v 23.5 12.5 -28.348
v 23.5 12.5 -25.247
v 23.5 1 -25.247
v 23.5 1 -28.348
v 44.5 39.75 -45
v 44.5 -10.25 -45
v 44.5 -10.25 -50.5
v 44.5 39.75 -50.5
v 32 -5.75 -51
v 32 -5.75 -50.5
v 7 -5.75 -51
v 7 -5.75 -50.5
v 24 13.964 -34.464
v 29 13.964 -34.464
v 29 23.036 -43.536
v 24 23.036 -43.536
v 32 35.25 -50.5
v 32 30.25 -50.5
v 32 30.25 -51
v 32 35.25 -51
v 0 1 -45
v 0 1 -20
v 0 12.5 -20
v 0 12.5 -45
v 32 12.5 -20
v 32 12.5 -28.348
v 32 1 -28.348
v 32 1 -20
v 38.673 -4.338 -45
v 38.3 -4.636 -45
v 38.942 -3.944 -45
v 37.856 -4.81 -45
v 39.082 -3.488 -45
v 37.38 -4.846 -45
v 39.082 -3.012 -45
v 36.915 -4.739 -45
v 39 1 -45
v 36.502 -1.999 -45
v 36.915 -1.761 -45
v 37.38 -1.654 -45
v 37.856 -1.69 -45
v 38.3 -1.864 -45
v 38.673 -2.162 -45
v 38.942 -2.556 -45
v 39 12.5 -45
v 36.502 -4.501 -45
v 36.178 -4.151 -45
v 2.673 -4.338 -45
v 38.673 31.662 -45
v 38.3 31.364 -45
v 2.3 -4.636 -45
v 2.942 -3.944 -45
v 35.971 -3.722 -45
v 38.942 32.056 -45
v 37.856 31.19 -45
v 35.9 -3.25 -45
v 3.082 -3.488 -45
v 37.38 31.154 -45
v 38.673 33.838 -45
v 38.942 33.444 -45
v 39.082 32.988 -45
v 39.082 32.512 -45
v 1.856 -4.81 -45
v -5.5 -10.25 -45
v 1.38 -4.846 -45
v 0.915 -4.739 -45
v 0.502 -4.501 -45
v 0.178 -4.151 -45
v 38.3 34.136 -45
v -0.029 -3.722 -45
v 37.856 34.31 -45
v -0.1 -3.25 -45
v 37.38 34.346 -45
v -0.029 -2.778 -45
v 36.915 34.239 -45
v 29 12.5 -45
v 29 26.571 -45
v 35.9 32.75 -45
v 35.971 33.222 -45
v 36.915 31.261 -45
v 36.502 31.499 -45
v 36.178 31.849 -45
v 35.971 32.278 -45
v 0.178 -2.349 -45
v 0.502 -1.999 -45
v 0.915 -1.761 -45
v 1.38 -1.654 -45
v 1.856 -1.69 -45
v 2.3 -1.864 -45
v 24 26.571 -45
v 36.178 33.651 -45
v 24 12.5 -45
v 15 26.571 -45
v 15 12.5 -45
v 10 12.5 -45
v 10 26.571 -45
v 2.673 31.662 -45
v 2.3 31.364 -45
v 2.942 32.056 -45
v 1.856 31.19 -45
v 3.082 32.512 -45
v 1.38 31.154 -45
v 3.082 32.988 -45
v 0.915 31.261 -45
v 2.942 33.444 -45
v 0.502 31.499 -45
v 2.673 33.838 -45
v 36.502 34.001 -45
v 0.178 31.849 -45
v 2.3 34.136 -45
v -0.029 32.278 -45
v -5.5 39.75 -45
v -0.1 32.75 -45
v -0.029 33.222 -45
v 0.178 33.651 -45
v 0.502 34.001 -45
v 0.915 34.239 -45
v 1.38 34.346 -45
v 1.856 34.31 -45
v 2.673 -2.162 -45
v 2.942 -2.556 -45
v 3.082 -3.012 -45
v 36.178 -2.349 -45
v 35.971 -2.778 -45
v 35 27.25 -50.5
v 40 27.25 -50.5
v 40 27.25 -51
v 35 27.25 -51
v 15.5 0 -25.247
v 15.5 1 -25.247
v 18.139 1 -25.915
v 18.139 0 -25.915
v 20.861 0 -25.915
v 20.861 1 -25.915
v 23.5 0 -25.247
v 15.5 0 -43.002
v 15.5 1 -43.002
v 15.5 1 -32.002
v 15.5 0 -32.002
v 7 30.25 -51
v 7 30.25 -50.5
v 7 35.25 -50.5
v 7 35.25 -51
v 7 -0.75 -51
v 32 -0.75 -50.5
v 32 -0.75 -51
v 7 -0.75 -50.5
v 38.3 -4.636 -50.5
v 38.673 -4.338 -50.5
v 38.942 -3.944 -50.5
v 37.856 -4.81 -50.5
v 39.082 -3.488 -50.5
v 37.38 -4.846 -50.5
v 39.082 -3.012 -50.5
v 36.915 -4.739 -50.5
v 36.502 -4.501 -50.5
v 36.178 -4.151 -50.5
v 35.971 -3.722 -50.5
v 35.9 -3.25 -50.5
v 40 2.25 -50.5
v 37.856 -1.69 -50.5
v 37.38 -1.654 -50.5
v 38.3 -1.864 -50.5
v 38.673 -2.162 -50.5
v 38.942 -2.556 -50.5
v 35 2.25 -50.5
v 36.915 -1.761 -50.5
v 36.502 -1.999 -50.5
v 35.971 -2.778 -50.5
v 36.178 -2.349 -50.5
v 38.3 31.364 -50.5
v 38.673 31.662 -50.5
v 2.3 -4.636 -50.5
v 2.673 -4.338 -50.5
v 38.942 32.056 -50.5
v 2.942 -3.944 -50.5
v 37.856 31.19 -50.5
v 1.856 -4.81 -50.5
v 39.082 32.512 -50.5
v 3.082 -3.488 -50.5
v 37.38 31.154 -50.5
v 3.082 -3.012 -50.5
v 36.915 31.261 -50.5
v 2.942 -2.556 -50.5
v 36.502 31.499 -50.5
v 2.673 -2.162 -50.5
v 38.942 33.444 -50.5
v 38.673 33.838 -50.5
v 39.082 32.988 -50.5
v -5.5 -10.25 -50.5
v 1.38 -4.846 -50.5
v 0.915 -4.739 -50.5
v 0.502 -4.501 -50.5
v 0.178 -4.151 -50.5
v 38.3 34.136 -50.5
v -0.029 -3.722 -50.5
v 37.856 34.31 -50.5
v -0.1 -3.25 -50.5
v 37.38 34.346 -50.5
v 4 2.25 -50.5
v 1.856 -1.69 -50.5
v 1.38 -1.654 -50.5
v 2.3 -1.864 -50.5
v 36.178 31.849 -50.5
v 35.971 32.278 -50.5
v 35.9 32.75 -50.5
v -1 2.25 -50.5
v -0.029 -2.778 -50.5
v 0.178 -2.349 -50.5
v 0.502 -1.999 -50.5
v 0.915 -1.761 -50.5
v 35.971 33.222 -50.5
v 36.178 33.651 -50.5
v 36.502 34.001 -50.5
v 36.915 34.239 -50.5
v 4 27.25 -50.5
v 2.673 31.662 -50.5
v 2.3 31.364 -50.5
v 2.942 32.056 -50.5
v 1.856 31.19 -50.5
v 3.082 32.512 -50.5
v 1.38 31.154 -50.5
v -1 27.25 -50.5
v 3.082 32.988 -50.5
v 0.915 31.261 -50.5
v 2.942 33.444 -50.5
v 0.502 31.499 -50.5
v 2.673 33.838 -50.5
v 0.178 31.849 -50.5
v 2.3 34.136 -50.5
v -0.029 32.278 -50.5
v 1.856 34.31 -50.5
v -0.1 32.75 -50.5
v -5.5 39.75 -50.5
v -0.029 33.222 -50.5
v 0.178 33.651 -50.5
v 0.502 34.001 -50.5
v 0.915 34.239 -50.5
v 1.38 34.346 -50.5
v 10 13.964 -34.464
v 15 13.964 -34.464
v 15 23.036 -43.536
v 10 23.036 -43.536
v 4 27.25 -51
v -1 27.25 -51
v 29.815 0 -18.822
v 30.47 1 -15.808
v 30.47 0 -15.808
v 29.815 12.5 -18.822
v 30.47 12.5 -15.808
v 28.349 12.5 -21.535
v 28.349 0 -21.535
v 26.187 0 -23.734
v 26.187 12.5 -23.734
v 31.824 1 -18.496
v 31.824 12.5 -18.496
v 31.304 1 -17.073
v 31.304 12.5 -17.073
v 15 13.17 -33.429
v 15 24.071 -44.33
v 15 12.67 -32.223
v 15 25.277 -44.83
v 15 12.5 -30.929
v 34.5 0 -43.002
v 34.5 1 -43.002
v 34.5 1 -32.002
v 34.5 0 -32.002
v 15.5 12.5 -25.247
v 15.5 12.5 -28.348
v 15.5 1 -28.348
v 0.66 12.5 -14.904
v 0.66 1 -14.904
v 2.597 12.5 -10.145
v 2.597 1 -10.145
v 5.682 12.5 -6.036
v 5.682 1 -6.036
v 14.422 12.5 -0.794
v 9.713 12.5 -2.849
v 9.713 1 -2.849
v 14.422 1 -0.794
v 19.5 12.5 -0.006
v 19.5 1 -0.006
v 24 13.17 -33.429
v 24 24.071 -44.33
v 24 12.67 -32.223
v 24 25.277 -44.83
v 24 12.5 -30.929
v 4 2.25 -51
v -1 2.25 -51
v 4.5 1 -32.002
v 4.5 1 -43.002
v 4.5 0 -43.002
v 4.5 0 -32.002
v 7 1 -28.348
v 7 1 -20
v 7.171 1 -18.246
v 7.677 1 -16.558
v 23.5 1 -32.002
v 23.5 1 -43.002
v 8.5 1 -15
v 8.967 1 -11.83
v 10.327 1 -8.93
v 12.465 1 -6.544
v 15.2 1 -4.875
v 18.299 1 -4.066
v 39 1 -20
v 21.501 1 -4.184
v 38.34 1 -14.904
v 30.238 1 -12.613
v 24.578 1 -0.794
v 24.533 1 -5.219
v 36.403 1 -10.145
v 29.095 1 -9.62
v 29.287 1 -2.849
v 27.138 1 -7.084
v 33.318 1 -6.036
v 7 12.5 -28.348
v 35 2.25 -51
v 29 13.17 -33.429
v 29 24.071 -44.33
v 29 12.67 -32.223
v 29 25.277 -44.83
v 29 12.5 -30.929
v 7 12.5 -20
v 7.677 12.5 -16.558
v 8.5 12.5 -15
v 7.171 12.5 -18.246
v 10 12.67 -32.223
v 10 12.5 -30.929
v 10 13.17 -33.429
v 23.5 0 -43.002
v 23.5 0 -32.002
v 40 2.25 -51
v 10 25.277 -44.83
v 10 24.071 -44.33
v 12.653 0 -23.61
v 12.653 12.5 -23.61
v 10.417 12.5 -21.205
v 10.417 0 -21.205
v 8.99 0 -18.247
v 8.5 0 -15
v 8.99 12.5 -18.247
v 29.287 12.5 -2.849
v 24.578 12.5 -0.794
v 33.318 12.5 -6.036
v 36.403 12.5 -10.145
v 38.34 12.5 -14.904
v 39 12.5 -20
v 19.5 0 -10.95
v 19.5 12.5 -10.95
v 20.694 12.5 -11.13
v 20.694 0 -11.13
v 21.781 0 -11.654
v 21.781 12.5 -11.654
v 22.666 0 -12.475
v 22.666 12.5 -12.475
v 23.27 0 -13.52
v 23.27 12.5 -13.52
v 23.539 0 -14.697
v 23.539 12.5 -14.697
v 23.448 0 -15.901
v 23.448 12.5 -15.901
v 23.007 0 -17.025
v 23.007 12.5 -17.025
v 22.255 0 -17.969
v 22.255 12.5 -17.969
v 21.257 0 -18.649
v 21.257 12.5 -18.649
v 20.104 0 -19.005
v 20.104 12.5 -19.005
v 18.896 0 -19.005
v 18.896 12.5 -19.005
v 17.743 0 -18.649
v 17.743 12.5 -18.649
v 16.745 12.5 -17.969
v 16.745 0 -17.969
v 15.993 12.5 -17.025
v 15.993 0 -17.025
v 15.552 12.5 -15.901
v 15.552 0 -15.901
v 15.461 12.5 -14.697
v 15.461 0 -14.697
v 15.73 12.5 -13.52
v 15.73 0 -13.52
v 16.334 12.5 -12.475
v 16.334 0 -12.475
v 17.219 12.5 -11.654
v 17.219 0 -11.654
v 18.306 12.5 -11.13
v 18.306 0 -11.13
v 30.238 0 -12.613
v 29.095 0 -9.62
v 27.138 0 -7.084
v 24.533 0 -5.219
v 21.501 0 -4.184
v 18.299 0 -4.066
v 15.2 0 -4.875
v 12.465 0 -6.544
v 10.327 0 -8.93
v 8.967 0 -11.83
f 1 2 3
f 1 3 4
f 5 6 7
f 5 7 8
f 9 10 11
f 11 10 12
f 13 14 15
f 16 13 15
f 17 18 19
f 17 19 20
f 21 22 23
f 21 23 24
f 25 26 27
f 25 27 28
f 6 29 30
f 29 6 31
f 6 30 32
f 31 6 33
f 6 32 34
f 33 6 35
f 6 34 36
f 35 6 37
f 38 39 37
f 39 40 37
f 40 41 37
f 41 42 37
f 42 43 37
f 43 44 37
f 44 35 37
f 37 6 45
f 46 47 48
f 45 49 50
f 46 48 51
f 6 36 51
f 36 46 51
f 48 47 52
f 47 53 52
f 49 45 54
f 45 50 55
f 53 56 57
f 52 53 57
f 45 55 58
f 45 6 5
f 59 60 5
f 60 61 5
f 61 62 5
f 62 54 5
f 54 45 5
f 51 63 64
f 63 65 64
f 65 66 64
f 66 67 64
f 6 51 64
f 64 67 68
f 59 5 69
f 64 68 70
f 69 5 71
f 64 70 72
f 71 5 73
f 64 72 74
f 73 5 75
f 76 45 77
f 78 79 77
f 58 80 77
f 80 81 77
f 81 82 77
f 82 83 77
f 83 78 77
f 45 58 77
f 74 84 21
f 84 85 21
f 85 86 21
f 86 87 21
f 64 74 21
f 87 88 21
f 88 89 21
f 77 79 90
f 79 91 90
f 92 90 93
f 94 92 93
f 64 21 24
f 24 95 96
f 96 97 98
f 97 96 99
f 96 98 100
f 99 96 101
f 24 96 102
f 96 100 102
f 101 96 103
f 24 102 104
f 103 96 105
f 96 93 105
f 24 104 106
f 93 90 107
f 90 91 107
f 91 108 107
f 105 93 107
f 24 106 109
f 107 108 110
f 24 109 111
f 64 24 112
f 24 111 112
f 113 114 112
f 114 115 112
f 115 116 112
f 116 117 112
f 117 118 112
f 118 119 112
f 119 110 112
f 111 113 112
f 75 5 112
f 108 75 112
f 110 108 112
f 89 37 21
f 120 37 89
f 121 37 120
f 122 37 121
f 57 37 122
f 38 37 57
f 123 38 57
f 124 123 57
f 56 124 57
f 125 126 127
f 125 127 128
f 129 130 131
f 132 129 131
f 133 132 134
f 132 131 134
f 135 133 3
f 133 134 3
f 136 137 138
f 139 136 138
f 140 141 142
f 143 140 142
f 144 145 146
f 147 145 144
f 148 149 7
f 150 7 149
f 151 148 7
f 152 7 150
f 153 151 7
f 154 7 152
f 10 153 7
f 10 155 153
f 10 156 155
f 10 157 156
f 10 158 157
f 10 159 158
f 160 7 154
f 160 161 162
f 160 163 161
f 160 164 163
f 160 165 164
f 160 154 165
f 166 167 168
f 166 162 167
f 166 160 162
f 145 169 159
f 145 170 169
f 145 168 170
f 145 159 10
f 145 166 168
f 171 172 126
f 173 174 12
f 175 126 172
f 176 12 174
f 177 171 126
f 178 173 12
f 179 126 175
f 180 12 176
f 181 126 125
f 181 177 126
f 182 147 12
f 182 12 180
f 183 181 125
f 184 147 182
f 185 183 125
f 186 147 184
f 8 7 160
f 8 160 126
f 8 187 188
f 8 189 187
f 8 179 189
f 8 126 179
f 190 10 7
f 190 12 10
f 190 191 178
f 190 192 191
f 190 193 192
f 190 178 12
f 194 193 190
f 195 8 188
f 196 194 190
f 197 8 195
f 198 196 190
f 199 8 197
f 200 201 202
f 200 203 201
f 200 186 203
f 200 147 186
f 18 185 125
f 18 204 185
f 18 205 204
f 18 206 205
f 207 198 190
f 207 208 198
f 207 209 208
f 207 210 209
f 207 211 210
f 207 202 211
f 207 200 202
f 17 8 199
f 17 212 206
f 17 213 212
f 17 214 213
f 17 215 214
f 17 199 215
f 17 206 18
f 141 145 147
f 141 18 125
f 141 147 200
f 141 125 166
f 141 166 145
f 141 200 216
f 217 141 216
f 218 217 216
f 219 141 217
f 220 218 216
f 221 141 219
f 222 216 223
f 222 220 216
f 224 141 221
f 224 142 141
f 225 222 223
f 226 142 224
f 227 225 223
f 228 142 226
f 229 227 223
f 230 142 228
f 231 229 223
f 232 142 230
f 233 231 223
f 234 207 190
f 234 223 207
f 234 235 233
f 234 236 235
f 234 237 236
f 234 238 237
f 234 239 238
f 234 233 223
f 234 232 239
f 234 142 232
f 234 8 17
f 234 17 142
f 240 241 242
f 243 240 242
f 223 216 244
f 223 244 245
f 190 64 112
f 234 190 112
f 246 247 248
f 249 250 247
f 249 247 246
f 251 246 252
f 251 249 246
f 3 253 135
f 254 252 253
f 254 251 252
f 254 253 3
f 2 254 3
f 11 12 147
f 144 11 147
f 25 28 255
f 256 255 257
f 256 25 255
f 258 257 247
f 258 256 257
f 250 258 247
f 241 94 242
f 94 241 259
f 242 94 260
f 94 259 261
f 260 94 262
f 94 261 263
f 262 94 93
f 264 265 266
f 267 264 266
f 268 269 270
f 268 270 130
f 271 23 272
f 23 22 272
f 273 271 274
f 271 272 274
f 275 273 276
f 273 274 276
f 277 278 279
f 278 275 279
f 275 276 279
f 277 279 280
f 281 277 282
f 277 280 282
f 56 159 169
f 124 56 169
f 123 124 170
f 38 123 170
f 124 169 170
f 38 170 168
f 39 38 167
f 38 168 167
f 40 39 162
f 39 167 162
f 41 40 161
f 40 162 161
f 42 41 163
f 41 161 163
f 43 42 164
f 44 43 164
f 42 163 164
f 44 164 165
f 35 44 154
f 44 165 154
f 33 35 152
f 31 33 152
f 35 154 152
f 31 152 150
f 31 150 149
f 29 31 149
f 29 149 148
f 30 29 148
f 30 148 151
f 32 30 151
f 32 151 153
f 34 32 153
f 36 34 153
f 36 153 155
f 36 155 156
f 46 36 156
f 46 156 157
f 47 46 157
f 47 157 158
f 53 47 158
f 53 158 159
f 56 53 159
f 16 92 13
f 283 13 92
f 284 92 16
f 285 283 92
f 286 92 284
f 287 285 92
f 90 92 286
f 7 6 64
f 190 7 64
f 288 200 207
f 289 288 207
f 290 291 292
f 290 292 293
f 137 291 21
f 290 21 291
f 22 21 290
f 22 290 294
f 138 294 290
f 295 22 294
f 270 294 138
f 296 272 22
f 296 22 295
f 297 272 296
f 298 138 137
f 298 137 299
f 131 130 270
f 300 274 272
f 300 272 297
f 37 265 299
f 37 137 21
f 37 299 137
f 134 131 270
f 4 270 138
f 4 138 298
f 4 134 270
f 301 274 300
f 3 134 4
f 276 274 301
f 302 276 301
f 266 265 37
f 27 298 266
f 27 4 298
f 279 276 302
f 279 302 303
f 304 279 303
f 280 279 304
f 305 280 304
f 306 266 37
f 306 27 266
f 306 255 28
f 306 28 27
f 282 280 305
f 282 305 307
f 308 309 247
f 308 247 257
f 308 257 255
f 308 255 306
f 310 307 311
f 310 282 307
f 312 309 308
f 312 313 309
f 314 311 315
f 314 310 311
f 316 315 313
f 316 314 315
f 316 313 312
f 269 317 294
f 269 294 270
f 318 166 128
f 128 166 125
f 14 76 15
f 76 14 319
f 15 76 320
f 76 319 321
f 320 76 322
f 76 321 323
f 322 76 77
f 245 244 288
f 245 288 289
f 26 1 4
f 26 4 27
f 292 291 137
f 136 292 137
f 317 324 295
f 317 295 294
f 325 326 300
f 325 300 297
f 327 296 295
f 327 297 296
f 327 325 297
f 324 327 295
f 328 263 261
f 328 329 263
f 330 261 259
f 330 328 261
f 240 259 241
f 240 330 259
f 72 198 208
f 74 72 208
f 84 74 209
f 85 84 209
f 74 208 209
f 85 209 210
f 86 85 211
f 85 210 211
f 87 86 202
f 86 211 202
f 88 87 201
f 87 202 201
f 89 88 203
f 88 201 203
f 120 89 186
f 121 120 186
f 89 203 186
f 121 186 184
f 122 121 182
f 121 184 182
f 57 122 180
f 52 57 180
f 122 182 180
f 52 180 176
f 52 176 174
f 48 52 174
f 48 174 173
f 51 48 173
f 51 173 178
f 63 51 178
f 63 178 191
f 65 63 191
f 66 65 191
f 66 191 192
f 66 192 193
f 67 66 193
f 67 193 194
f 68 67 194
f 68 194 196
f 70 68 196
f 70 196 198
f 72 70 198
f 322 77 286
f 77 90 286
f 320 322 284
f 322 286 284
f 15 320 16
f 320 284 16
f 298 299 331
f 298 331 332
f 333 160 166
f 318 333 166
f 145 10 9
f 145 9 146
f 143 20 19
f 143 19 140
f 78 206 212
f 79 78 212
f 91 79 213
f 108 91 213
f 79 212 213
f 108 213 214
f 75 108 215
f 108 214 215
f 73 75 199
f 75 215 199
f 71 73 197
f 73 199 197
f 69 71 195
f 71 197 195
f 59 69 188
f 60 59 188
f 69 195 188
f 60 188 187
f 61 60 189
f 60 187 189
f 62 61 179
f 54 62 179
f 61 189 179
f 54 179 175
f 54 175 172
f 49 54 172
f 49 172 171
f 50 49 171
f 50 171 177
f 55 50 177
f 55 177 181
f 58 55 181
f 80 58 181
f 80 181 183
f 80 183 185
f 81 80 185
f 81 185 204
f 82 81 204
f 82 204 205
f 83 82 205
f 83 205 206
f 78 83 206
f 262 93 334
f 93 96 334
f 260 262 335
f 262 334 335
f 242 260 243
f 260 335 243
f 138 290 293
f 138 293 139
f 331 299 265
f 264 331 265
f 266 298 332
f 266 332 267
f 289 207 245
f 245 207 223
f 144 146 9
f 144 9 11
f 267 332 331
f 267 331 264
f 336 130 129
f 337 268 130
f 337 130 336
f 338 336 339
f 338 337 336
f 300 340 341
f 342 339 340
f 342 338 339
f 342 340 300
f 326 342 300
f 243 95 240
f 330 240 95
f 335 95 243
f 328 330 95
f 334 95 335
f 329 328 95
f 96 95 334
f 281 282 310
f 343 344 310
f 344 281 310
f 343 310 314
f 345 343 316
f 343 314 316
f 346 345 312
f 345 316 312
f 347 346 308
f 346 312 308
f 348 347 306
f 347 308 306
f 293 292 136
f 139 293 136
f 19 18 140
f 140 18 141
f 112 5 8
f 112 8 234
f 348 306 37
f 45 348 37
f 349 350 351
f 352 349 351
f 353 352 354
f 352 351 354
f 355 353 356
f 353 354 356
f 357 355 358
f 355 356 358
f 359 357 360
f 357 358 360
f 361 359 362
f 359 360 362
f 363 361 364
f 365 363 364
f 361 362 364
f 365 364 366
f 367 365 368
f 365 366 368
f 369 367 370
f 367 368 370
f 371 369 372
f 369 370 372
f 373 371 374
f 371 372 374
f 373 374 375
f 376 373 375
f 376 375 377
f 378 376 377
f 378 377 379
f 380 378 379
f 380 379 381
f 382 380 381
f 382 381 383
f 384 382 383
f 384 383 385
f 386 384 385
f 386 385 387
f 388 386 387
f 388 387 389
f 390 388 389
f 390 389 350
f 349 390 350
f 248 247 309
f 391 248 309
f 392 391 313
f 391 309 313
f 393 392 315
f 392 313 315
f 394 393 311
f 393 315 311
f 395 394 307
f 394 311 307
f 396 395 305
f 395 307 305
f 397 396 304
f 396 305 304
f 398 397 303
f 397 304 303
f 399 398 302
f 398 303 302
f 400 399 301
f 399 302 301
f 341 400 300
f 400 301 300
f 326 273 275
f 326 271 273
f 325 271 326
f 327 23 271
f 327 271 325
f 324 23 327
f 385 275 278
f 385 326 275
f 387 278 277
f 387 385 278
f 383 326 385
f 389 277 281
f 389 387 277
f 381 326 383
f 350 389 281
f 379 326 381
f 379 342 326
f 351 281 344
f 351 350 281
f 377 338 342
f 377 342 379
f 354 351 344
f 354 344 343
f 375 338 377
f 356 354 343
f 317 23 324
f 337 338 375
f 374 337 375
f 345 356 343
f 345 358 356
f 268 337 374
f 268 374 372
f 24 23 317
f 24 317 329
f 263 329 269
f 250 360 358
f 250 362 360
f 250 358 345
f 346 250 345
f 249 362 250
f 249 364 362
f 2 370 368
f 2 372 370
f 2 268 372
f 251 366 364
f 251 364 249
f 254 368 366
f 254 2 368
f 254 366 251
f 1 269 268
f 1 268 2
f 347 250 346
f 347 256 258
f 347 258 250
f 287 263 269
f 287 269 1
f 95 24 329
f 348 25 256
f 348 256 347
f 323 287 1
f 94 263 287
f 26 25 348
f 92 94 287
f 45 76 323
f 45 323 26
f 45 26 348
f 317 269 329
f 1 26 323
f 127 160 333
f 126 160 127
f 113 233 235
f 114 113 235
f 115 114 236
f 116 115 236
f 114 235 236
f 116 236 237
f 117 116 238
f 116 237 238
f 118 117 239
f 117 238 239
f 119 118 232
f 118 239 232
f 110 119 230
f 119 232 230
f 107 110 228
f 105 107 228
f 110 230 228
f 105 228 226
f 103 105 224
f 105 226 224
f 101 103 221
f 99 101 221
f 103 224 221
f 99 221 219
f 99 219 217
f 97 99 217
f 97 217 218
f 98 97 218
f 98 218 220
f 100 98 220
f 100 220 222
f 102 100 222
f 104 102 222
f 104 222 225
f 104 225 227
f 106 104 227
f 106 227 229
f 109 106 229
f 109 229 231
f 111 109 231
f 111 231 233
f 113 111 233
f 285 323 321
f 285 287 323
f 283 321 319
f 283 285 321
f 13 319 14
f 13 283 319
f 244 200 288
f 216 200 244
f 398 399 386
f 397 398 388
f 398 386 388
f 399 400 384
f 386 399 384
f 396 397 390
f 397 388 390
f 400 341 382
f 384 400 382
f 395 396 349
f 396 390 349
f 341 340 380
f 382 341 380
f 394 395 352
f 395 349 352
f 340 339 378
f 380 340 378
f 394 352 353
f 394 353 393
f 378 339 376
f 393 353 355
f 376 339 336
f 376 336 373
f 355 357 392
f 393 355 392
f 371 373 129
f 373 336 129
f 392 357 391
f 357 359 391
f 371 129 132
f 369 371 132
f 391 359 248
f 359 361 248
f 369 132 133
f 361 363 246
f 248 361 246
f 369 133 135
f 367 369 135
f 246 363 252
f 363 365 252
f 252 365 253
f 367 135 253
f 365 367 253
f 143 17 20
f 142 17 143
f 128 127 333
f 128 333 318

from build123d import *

# Parameters (mm, degrees)
SKETCH1_W           = 39
SKETCH1_H           = 45
BOSS_EXTRUDE1_DEPTH = 12.5
SKETCH2_R           = 4.05
CUT_EXTRUDE1_DEPTH  = 61.846117378
SKETCH3_W           = 50
SKETCH3_H           = 50
BOSS_EXTRUDE2_DEPTH = 5.5
BOSS_EXTRUDE3_START = -10
BOSS_EXTRUDE3_DEPTH = 5
LPATTERN1_COUNT     = 2
LPATTERN1_PITCH     = 14
FILLET1_R           = 5
SKETCH5_R           = 1.6
CUT_EXTRUDE2_DEPTH  = 79.17008699
FILLET2_R           = 20
CUT_EXTRUDE3_DEPTH  = 73.615855707
CUT_EXTRUDE4_START  = -1
SKETCH7_W           = 39.2
SKETCH7_H           = 50.063664736
SKETCH7_R           = 11
SKETCH7_W_2         = 11
SKETCH7_H_2         = 11
CUT_EXTRUDE4_DEPTH  = 1
SKETCH8_W           = 25
SKETCH8_H           = 5
SKETCH8_W_2         = 5
SKETCH8_H_2         = 25
BOSS_EXTRUDE4_DEPTH = 0.5


with BuildPart() as part:
    # Sketch1 → Boss-Extrude1 (new body)
    with BuildSketch(Plane(origin=(0, 0, 0), x_dir=(1, 0, 0), z_dir=(0, 1, 0))):
        with Locations((19.5, 22.5)):
            Rectangle(SKETCH1_W, SKETCH1_H)
    extrude(amount=BOSS_EXTRUDE1_DEPTH)

    # Sketch2 → Cut-Extrude1 (cut, through all)
    with BuildSketch(Plane(origin=(0, 12.5, 0), x_dir=(1, 0, 0), z_dir=(0, 1, 0))):
        with Locations(Location((19.5, 15, 0), (0, 0, 270))):
            Circle(SKETCH2_R)
    extrude(amount=-CUT_EXTRUDE1_DEPTH, mode=Mode.SUBTRACT)

    # Sketch3 → Boss-Extrude2 (add)
    with BuildSketch(Plane(origin=(0, 0, -45), x_dir=(-1, 0, 0), z_dir=(0, 0, -1))):
        with Locations((-19.5, 14.75)):
            Rectangle(SKETCH3_W, SKETCH3_H)
    extrude(amount=BOSS_EXTRUDE2_DEPTH)

    # Sketch4 → Boss-Extrude3 (add)
    with BuildSketch(Plane(origin=(39, 0, 0), x_dir=(0, 0, -1), z_dir=(1, 0, 0)).offset(BOSS_EXTRUDE3_START)):
        Polygon((33, 12.5), (45, 24.5), (45, 12.5), align=None)
    boss_extrude3 = extrude(amount=-BOSS_EXTRUDE3_DEPTH)

    # LPattern1: Boss-Extrude3 ×2
    with Locations(*[(-i * LPATTERN1_PITCH, 0, 0) for i in range(1, LPATTERN1_COUNT)]):
        add(boss_extrude3)

    # Fillet1
    fillet1_edges = [part.edges().sort_by_distance(p)[0] for p in [
        (26.5, 12.5, -33),
        (26.5, 24.5, -45),
        (12.5, 12.5, -33),
        (12.5, 24.5, -45),
    ]]
    fillet(fillet1_edges, radius=FILLET1_R)

    # Sketch5 → Cut-Extrude2 (cut, through all)
    with BuildSketch(Plane(origin=(0, 0, -50.5), x_dir=(-1, 0, 0), z_dir=(0, 0, -1))):
        with Locations((-37.5, 32.75)):
            Circle(SKETCH5_R)
        with Locations((-1.5, 32.75)):
            Circle(SKETCH5_R)
        with Locations((-1.5, -3.25)):
            Circle(SKETCH5_R)
        with Locations((-37.5, -3.25)):
            Circle(SKETCH5_R)
    extrude(amount=-CUT_EXTRUDE2_DEPTH, mode=Mode.SUBTRACT)

    # Fillet2
    # the kernel refuses this fillet: 20 mm, written as the material it takes off along each edge
    with BuildSketch(Plane(origin=(0, -50, 0), x_dir=(0, 0, -1), z_dir=(0, 1, 0))) as fillet2_piece_1:
        with BuildLine():
            CenterArc((FILLET2_R, -FILLET2_R), FILLET2_R, 90, 90)
            Line((0, -FILLET2_R), (0, 0))
            Line((0, 0), (FILLET2_R, 0))
        make_face()
    extrude(amount=112.5, mode=Mode.SUBTRACT)
    with BuildSketch(Plane(origin=(39, -50, 0), x_dir=(0, 0, -1), z_dir=(0, 1, 0))) as fillet2_piece_2:
        with BuildLine():
            CenterArc((FILLET2_R, FILLET2_R), FILLET2_R, 180, 90)
            Line((0, FILLET2_R), (0, 0))
            Line((0, 0), (FILLET2_R, 0))
        make_face()
    extrude(amount=112.5, mode=Mode.SUBTRACT)

    # Sketch6 → Cut-Extrude3 (cut, through all)
    with BuildSketch(Plane(origin=(0, 12.5, 0), x_dir=(1, 0, 0), z_dir=(0, 1, 0))):
        with BuildLine():
            Line((7, 20), (7, 28.347560338))
            Line((7, 28.347560338), (15.5, 28.347560338))
            Line((15.5, 28.347560338), (15.5, 25.246950766))
            ThreePointArc((15.5, 25.246950766), (10.417048938, 21.204836823), (8.5, 15))
            ThreePointArc((8.5, 15), (7.383077909, 17.389923373), (7, 20))
        make_face()
        with BuildLine():
            Line((23.5, 25.246950766), (23.5, 28.347560338))
            Line((23.5, 28.347560338), (32, 28.347560338))
            Line((32, 28.347560338), (32, 20))
            ThreePointArc((32, 20), (31.605614865, 17.768951725), (30.47026085, 15.808317311))
            ThreePointArc((30.47026085, 15.808317311), (28.348679441, 21.534590434), (23.5, 25.246950766))
        make_face()
    extrude(amount=-CUT_EXTRUDE3_DEPTH, mode=Mode.SUBTRACT)

    # Sketch7 → Cut-Extrude4 (cut)
    with BuildSketch(Plane.XZ.offset(CUT_EXTRUDE4_START)):
        with Locations((19.5, -19.968167632)):
            Rectangle(SKETCH7_W, SKETCH7_H)
        with Locations(Location((19.5, -15, 0), (0, 0, 180))):
            Circle(SKETCH7_R, mode=Mode.SUBTRACT)
        with Locations((10, -37.501795484)):
            Rectangle(SKETCH7_W_2, SKETCH7_H_2, mode=Mode.SUBTRACT)
        with Locations((29, -37.501795484)):
            Rectangle(SKETCH7_W_2, SKETCH7_H_2, mode=Mode.SUBTRACT)
    extrude(amount=CUT_EXTRUDE4_DEPTH, mode=Mode.SUBTRACT)

    # Sketch8 → Boss-Extrude4 (add)
    with BuildSketch(Plane(origin=(0, 0, -50.5), x_dir=(-1, 0, 0), z_dir=(0, 0, -1))):
        with Locations((-19.5, 32.75)):
            Rectangle(SKETCH8_W, SKETCH8_H)
        with Locations((-1.5, 14.75)):
            Rectangle(SKETCH8_W_2, SKETCH8_H_2)
        with Locations((-19.5, -3.25)):
            Rectangle(SKETCH8_W, SKETCH8_H)
        with Locations((-37.5, 14.75)):
            Rectangle(SKETCH8_W_2, SKETCH8_H_2)
    extrude(amount=BOSS_EXTRUDE4_DEPTH)


solid = part.part
